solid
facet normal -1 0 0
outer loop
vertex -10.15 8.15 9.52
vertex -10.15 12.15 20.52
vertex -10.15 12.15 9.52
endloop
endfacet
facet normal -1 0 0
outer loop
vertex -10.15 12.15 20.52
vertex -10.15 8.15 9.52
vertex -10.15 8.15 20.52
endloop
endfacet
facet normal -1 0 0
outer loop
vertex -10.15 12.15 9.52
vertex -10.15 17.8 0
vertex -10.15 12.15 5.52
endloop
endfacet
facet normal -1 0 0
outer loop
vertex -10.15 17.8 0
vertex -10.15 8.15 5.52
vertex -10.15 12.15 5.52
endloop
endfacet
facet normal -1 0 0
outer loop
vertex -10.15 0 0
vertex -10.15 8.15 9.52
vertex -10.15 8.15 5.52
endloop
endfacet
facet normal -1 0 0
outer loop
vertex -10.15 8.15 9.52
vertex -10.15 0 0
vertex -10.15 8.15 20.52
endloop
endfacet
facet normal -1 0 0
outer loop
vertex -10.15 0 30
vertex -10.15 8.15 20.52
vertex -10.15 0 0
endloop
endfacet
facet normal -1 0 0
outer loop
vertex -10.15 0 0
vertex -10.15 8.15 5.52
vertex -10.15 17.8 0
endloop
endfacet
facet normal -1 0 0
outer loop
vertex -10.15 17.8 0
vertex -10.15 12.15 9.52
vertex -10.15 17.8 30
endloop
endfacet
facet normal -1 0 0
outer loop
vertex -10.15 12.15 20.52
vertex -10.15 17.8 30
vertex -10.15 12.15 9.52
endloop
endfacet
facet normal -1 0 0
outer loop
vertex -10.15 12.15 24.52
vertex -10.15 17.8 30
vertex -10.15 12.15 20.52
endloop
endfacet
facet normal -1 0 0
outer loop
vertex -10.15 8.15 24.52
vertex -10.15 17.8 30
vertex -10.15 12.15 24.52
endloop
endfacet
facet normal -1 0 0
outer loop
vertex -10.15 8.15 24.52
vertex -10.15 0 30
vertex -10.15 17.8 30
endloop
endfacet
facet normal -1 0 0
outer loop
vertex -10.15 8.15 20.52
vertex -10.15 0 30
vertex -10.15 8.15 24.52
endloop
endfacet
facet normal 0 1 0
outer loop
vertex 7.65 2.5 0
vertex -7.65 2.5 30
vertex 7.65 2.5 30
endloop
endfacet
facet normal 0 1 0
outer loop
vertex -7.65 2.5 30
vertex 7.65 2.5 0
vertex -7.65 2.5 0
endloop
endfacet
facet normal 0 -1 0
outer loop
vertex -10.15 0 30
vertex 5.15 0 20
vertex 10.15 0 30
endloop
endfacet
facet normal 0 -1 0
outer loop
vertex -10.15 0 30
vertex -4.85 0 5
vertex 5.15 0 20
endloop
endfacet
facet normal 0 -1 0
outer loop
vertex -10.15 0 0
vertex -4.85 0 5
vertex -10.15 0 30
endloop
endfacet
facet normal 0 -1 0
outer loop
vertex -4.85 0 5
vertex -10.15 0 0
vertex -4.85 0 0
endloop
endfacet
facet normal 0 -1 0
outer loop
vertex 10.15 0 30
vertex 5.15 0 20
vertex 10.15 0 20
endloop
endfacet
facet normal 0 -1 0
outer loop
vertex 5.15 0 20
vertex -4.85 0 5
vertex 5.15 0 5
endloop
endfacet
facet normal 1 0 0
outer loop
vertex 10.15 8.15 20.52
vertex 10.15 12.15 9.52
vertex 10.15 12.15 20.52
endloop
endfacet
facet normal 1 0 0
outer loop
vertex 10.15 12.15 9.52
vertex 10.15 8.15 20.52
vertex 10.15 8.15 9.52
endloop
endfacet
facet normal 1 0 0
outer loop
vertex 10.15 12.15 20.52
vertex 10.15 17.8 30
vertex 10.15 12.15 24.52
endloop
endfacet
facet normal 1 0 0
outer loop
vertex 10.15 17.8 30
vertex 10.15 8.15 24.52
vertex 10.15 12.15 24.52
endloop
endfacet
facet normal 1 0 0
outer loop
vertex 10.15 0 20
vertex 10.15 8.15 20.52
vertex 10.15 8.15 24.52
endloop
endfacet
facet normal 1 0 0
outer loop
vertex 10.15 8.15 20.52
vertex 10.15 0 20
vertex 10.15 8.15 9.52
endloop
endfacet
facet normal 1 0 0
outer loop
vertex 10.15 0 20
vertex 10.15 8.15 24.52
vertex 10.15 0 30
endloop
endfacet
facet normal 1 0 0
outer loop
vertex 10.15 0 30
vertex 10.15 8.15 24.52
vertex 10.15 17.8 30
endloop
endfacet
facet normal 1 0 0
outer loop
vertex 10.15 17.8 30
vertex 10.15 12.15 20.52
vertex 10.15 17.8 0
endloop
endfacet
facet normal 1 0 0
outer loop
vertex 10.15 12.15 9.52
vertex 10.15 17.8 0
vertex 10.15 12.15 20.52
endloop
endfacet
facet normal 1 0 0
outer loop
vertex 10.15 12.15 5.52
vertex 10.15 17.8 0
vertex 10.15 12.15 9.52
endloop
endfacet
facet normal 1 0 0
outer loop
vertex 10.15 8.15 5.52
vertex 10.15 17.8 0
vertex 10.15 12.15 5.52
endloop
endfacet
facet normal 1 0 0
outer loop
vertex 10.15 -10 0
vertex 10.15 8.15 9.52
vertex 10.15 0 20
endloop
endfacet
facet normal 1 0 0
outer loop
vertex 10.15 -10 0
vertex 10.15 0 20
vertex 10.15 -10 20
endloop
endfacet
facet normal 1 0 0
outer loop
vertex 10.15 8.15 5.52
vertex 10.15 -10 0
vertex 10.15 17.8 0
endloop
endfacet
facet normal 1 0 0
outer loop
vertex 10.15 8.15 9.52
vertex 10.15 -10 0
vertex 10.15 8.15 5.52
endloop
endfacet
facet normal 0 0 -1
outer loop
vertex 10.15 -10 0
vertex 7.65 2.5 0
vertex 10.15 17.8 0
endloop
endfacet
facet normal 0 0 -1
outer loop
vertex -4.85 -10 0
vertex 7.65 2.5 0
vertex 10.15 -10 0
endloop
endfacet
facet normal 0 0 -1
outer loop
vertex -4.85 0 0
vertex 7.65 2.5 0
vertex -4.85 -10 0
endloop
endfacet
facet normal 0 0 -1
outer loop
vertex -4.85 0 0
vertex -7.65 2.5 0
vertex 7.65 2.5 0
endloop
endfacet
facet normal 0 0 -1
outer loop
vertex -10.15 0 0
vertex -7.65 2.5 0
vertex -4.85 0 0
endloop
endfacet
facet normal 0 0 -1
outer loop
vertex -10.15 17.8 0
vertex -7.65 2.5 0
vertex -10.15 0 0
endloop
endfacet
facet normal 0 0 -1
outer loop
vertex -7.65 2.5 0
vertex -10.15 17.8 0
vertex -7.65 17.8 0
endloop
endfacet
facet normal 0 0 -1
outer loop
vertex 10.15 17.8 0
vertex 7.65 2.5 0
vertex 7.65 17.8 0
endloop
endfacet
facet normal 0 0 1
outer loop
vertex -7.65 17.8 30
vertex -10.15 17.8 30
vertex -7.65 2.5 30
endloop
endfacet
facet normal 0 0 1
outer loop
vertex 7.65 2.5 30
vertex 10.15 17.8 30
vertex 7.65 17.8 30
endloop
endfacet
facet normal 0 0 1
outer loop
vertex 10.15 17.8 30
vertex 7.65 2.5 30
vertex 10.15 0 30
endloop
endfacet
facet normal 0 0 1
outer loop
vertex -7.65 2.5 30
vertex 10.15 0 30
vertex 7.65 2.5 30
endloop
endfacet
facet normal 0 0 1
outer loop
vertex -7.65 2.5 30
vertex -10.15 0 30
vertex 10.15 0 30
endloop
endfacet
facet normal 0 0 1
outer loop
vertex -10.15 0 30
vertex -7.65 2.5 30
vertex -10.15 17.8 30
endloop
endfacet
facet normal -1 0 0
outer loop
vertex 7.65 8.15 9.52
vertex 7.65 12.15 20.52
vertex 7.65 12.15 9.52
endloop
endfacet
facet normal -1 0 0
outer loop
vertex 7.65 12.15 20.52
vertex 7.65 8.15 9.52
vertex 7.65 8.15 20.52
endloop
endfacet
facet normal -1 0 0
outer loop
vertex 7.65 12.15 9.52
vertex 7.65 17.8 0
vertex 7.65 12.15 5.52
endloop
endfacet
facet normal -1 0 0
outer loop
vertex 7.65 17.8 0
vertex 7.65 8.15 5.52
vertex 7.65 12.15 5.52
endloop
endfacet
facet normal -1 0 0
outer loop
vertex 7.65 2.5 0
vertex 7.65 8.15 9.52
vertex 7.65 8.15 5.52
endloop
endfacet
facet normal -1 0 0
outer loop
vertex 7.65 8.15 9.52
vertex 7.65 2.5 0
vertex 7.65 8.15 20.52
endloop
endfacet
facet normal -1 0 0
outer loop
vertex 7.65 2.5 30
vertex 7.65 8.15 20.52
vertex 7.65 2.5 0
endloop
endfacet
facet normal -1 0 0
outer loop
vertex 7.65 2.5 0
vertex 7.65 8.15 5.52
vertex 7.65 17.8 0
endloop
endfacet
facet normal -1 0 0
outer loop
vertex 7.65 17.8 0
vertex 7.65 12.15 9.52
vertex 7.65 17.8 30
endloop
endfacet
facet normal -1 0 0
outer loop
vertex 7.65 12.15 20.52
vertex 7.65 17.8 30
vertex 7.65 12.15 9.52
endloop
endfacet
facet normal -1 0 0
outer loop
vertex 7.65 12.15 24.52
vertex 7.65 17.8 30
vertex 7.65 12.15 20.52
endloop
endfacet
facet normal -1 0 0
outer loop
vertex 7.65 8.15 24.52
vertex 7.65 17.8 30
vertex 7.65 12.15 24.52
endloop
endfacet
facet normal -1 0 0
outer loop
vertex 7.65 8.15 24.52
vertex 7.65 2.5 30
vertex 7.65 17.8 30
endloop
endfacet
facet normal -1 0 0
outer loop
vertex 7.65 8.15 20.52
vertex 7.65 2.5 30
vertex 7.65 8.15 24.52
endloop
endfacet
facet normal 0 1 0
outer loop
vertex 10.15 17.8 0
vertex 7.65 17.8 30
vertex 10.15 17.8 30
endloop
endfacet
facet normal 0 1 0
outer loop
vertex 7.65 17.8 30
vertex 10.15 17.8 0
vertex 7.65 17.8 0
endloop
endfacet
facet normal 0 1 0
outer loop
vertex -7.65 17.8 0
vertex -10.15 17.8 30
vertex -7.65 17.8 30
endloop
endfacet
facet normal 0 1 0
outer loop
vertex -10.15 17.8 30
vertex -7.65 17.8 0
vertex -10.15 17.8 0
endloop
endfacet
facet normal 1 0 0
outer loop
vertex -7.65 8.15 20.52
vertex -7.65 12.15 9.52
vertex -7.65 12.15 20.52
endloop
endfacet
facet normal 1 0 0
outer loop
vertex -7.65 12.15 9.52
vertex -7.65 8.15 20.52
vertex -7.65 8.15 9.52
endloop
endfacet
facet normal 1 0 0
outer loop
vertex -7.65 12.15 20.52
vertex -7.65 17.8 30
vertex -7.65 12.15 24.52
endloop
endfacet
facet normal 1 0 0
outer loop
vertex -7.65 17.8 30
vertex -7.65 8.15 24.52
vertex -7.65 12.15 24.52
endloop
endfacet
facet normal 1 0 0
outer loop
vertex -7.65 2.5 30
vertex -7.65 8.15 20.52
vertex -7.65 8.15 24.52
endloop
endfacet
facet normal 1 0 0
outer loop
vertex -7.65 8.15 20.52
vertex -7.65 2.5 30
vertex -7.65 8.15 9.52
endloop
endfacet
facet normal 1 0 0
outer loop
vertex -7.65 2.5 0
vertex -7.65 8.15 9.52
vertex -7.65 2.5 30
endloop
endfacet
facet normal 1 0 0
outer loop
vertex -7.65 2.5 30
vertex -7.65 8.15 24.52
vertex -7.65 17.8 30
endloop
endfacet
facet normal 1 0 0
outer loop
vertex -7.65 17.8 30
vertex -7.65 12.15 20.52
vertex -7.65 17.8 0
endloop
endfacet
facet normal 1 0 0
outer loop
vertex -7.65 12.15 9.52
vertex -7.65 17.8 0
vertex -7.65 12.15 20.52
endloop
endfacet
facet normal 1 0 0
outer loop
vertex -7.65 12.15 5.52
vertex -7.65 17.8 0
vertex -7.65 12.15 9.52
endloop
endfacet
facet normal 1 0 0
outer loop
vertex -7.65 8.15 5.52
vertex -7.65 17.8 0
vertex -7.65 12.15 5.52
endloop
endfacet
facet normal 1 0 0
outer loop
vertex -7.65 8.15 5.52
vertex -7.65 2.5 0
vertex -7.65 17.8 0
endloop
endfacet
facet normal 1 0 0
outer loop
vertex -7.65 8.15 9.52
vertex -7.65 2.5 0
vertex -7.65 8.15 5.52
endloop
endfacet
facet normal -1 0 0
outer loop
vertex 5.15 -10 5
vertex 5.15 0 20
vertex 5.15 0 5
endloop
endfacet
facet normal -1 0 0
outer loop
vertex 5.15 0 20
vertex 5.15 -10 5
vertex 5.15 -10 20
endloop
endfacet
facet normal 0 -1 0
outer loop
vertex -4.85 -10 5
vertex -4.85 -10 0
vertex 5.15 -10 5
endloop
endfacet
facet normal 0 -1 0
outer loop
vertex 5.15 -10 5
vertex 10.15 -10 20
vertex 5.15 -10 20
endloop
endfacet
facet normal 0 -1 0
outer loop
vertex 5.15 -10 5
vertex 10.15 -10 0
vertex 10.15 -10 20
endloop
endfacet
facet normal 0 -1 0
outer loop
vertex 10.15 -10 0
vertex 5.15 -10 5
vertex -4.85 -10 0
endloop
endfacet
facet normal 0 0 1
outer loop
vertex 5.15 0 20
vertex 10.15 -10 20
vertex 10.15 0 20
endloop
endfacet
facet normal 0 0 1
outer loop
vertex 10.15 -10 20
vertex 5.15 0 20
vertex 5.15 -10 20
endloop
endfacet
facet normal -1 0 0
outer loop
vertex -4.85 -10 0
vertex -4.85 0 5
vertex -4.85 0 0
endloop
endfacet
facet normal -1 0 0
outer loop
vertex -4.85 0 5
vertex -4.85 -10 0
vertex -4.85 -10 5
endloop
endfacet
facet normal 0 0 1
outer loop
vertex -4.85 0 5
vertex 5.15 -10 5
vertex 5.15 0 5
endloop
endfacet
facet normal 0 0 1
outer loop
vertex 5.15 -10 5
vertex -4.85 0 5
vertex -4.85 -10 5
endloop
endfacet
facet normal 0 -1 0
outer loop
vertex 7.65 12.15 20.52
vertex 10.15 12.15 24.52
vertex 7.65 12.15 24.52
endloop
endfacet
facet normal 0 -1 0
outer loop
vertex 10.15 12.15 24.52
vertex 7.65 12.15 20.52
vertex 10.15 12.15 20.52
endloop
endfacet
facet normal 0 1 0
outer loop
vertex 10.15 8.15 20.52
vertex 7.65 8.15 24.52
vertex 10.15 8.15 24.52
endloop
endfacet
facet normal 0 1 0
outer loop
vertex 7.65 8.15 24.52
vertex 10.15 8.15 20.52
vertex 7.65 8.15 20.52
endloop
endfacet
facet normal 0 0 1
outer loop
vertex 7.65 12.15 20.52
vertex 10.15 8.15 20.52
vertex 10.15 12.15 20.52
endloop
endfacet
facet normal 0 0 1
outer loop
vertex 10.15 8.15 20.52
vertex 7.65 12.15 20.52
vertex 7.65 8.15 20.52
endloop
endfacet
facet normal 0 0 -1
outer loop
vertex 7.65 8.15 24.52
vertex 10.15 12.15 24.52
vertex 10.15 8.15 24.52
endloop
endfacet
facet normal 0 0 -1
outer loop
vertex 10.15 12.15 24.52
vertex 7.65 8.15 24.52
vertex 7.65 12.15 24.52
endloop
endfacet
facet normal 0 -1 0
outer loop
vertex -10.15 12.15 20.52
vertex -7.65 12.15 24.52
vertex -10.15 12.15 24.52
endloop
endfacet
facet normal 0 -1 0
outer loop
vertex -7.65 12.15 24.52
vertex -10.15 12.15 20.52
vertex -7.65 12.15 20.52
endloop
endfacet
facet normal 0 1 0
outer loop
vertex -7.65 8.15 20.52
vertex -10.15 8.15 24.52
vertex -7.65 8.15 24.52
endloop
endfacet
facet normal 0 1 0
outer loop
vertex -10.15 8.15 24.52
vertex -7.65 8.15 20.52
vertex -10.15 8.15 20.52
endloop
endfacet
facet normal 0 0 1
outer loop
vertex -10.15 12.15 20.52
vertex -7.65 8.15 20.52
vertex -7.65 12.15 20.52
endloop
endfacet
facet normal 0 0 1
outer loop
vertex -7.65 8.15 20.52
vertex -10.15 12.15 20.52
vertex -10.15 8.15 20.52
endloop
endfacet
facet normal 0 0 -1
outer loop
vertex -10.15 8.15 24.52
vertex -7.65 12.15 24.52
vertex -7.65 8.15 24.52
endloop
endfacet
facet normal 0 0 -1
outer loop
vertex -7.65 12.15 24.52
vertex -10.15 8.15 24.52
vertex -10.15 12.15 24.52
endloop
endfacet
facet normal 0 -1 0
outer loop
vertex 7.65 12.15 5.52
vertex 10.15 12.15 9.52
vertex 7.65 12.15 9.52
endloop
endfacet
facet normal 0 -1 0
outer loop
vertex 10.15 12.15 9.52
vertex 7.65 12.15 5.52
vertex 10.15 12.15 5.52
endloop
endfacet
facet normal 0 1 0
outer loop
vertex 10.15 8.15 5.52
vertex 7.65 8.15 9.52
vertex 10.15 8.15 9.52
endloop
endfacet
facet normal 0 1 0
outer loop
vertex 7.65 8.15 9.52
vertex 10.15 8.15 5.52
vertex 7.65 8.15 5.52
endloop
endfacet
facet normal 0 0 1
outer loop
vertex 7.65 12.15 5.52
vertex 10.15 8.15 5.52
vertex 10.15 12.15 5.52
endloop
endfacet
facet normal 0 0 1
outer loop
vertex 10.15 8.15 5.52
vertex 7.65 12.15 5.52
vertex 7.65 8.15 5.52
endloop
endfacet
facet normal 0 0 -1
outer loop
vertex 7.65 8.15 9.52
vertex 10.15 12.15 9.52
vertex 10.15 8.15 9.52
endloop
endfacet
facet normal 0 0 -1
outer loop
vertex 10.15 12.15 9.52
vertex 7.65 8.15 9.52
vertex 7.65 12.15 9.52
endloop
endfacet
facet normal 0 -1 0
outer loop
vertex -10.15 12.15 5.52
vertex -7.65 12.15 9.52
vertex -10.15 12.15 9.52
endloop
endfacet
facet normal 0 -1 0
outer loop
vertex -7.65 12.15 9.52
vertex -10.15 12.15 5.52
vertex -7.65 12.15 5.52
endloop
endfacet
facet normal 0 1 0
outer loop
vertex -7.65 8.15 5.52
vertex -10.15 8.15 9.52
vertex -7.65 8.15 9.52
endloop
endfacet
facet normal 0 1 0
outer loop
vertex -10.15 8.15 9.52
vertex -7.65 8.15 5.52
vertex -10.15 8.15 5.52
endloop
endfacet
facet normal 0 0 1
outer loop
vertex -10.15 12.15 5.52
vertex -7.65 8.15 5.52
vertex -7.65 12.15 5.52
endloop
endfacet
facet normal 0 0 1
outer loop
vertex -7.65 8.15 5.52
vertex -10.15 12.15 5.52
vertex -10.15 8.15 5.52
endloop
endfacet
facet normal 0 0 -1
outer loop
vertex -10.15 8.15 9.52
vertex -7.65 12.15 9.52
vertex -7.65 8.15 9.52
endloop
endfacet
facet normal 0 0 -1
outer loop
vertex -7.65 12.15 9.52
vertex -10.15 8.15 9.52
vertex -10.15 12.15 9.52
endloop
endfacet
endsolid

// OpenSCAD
// HomeRacker switch corner bracket, mirrored - catches the opposite
// corner from homeracker_switch_corner_bracket.scad. Print TWO of these
// plus two of the unmirrored version - see
// _homeracker_switch_corner_bracket_lib.scad for the full design notes.
include <_homeracker_switch_corner_bracket_lib.scad>
render_bracket(mirror_piece = true);
